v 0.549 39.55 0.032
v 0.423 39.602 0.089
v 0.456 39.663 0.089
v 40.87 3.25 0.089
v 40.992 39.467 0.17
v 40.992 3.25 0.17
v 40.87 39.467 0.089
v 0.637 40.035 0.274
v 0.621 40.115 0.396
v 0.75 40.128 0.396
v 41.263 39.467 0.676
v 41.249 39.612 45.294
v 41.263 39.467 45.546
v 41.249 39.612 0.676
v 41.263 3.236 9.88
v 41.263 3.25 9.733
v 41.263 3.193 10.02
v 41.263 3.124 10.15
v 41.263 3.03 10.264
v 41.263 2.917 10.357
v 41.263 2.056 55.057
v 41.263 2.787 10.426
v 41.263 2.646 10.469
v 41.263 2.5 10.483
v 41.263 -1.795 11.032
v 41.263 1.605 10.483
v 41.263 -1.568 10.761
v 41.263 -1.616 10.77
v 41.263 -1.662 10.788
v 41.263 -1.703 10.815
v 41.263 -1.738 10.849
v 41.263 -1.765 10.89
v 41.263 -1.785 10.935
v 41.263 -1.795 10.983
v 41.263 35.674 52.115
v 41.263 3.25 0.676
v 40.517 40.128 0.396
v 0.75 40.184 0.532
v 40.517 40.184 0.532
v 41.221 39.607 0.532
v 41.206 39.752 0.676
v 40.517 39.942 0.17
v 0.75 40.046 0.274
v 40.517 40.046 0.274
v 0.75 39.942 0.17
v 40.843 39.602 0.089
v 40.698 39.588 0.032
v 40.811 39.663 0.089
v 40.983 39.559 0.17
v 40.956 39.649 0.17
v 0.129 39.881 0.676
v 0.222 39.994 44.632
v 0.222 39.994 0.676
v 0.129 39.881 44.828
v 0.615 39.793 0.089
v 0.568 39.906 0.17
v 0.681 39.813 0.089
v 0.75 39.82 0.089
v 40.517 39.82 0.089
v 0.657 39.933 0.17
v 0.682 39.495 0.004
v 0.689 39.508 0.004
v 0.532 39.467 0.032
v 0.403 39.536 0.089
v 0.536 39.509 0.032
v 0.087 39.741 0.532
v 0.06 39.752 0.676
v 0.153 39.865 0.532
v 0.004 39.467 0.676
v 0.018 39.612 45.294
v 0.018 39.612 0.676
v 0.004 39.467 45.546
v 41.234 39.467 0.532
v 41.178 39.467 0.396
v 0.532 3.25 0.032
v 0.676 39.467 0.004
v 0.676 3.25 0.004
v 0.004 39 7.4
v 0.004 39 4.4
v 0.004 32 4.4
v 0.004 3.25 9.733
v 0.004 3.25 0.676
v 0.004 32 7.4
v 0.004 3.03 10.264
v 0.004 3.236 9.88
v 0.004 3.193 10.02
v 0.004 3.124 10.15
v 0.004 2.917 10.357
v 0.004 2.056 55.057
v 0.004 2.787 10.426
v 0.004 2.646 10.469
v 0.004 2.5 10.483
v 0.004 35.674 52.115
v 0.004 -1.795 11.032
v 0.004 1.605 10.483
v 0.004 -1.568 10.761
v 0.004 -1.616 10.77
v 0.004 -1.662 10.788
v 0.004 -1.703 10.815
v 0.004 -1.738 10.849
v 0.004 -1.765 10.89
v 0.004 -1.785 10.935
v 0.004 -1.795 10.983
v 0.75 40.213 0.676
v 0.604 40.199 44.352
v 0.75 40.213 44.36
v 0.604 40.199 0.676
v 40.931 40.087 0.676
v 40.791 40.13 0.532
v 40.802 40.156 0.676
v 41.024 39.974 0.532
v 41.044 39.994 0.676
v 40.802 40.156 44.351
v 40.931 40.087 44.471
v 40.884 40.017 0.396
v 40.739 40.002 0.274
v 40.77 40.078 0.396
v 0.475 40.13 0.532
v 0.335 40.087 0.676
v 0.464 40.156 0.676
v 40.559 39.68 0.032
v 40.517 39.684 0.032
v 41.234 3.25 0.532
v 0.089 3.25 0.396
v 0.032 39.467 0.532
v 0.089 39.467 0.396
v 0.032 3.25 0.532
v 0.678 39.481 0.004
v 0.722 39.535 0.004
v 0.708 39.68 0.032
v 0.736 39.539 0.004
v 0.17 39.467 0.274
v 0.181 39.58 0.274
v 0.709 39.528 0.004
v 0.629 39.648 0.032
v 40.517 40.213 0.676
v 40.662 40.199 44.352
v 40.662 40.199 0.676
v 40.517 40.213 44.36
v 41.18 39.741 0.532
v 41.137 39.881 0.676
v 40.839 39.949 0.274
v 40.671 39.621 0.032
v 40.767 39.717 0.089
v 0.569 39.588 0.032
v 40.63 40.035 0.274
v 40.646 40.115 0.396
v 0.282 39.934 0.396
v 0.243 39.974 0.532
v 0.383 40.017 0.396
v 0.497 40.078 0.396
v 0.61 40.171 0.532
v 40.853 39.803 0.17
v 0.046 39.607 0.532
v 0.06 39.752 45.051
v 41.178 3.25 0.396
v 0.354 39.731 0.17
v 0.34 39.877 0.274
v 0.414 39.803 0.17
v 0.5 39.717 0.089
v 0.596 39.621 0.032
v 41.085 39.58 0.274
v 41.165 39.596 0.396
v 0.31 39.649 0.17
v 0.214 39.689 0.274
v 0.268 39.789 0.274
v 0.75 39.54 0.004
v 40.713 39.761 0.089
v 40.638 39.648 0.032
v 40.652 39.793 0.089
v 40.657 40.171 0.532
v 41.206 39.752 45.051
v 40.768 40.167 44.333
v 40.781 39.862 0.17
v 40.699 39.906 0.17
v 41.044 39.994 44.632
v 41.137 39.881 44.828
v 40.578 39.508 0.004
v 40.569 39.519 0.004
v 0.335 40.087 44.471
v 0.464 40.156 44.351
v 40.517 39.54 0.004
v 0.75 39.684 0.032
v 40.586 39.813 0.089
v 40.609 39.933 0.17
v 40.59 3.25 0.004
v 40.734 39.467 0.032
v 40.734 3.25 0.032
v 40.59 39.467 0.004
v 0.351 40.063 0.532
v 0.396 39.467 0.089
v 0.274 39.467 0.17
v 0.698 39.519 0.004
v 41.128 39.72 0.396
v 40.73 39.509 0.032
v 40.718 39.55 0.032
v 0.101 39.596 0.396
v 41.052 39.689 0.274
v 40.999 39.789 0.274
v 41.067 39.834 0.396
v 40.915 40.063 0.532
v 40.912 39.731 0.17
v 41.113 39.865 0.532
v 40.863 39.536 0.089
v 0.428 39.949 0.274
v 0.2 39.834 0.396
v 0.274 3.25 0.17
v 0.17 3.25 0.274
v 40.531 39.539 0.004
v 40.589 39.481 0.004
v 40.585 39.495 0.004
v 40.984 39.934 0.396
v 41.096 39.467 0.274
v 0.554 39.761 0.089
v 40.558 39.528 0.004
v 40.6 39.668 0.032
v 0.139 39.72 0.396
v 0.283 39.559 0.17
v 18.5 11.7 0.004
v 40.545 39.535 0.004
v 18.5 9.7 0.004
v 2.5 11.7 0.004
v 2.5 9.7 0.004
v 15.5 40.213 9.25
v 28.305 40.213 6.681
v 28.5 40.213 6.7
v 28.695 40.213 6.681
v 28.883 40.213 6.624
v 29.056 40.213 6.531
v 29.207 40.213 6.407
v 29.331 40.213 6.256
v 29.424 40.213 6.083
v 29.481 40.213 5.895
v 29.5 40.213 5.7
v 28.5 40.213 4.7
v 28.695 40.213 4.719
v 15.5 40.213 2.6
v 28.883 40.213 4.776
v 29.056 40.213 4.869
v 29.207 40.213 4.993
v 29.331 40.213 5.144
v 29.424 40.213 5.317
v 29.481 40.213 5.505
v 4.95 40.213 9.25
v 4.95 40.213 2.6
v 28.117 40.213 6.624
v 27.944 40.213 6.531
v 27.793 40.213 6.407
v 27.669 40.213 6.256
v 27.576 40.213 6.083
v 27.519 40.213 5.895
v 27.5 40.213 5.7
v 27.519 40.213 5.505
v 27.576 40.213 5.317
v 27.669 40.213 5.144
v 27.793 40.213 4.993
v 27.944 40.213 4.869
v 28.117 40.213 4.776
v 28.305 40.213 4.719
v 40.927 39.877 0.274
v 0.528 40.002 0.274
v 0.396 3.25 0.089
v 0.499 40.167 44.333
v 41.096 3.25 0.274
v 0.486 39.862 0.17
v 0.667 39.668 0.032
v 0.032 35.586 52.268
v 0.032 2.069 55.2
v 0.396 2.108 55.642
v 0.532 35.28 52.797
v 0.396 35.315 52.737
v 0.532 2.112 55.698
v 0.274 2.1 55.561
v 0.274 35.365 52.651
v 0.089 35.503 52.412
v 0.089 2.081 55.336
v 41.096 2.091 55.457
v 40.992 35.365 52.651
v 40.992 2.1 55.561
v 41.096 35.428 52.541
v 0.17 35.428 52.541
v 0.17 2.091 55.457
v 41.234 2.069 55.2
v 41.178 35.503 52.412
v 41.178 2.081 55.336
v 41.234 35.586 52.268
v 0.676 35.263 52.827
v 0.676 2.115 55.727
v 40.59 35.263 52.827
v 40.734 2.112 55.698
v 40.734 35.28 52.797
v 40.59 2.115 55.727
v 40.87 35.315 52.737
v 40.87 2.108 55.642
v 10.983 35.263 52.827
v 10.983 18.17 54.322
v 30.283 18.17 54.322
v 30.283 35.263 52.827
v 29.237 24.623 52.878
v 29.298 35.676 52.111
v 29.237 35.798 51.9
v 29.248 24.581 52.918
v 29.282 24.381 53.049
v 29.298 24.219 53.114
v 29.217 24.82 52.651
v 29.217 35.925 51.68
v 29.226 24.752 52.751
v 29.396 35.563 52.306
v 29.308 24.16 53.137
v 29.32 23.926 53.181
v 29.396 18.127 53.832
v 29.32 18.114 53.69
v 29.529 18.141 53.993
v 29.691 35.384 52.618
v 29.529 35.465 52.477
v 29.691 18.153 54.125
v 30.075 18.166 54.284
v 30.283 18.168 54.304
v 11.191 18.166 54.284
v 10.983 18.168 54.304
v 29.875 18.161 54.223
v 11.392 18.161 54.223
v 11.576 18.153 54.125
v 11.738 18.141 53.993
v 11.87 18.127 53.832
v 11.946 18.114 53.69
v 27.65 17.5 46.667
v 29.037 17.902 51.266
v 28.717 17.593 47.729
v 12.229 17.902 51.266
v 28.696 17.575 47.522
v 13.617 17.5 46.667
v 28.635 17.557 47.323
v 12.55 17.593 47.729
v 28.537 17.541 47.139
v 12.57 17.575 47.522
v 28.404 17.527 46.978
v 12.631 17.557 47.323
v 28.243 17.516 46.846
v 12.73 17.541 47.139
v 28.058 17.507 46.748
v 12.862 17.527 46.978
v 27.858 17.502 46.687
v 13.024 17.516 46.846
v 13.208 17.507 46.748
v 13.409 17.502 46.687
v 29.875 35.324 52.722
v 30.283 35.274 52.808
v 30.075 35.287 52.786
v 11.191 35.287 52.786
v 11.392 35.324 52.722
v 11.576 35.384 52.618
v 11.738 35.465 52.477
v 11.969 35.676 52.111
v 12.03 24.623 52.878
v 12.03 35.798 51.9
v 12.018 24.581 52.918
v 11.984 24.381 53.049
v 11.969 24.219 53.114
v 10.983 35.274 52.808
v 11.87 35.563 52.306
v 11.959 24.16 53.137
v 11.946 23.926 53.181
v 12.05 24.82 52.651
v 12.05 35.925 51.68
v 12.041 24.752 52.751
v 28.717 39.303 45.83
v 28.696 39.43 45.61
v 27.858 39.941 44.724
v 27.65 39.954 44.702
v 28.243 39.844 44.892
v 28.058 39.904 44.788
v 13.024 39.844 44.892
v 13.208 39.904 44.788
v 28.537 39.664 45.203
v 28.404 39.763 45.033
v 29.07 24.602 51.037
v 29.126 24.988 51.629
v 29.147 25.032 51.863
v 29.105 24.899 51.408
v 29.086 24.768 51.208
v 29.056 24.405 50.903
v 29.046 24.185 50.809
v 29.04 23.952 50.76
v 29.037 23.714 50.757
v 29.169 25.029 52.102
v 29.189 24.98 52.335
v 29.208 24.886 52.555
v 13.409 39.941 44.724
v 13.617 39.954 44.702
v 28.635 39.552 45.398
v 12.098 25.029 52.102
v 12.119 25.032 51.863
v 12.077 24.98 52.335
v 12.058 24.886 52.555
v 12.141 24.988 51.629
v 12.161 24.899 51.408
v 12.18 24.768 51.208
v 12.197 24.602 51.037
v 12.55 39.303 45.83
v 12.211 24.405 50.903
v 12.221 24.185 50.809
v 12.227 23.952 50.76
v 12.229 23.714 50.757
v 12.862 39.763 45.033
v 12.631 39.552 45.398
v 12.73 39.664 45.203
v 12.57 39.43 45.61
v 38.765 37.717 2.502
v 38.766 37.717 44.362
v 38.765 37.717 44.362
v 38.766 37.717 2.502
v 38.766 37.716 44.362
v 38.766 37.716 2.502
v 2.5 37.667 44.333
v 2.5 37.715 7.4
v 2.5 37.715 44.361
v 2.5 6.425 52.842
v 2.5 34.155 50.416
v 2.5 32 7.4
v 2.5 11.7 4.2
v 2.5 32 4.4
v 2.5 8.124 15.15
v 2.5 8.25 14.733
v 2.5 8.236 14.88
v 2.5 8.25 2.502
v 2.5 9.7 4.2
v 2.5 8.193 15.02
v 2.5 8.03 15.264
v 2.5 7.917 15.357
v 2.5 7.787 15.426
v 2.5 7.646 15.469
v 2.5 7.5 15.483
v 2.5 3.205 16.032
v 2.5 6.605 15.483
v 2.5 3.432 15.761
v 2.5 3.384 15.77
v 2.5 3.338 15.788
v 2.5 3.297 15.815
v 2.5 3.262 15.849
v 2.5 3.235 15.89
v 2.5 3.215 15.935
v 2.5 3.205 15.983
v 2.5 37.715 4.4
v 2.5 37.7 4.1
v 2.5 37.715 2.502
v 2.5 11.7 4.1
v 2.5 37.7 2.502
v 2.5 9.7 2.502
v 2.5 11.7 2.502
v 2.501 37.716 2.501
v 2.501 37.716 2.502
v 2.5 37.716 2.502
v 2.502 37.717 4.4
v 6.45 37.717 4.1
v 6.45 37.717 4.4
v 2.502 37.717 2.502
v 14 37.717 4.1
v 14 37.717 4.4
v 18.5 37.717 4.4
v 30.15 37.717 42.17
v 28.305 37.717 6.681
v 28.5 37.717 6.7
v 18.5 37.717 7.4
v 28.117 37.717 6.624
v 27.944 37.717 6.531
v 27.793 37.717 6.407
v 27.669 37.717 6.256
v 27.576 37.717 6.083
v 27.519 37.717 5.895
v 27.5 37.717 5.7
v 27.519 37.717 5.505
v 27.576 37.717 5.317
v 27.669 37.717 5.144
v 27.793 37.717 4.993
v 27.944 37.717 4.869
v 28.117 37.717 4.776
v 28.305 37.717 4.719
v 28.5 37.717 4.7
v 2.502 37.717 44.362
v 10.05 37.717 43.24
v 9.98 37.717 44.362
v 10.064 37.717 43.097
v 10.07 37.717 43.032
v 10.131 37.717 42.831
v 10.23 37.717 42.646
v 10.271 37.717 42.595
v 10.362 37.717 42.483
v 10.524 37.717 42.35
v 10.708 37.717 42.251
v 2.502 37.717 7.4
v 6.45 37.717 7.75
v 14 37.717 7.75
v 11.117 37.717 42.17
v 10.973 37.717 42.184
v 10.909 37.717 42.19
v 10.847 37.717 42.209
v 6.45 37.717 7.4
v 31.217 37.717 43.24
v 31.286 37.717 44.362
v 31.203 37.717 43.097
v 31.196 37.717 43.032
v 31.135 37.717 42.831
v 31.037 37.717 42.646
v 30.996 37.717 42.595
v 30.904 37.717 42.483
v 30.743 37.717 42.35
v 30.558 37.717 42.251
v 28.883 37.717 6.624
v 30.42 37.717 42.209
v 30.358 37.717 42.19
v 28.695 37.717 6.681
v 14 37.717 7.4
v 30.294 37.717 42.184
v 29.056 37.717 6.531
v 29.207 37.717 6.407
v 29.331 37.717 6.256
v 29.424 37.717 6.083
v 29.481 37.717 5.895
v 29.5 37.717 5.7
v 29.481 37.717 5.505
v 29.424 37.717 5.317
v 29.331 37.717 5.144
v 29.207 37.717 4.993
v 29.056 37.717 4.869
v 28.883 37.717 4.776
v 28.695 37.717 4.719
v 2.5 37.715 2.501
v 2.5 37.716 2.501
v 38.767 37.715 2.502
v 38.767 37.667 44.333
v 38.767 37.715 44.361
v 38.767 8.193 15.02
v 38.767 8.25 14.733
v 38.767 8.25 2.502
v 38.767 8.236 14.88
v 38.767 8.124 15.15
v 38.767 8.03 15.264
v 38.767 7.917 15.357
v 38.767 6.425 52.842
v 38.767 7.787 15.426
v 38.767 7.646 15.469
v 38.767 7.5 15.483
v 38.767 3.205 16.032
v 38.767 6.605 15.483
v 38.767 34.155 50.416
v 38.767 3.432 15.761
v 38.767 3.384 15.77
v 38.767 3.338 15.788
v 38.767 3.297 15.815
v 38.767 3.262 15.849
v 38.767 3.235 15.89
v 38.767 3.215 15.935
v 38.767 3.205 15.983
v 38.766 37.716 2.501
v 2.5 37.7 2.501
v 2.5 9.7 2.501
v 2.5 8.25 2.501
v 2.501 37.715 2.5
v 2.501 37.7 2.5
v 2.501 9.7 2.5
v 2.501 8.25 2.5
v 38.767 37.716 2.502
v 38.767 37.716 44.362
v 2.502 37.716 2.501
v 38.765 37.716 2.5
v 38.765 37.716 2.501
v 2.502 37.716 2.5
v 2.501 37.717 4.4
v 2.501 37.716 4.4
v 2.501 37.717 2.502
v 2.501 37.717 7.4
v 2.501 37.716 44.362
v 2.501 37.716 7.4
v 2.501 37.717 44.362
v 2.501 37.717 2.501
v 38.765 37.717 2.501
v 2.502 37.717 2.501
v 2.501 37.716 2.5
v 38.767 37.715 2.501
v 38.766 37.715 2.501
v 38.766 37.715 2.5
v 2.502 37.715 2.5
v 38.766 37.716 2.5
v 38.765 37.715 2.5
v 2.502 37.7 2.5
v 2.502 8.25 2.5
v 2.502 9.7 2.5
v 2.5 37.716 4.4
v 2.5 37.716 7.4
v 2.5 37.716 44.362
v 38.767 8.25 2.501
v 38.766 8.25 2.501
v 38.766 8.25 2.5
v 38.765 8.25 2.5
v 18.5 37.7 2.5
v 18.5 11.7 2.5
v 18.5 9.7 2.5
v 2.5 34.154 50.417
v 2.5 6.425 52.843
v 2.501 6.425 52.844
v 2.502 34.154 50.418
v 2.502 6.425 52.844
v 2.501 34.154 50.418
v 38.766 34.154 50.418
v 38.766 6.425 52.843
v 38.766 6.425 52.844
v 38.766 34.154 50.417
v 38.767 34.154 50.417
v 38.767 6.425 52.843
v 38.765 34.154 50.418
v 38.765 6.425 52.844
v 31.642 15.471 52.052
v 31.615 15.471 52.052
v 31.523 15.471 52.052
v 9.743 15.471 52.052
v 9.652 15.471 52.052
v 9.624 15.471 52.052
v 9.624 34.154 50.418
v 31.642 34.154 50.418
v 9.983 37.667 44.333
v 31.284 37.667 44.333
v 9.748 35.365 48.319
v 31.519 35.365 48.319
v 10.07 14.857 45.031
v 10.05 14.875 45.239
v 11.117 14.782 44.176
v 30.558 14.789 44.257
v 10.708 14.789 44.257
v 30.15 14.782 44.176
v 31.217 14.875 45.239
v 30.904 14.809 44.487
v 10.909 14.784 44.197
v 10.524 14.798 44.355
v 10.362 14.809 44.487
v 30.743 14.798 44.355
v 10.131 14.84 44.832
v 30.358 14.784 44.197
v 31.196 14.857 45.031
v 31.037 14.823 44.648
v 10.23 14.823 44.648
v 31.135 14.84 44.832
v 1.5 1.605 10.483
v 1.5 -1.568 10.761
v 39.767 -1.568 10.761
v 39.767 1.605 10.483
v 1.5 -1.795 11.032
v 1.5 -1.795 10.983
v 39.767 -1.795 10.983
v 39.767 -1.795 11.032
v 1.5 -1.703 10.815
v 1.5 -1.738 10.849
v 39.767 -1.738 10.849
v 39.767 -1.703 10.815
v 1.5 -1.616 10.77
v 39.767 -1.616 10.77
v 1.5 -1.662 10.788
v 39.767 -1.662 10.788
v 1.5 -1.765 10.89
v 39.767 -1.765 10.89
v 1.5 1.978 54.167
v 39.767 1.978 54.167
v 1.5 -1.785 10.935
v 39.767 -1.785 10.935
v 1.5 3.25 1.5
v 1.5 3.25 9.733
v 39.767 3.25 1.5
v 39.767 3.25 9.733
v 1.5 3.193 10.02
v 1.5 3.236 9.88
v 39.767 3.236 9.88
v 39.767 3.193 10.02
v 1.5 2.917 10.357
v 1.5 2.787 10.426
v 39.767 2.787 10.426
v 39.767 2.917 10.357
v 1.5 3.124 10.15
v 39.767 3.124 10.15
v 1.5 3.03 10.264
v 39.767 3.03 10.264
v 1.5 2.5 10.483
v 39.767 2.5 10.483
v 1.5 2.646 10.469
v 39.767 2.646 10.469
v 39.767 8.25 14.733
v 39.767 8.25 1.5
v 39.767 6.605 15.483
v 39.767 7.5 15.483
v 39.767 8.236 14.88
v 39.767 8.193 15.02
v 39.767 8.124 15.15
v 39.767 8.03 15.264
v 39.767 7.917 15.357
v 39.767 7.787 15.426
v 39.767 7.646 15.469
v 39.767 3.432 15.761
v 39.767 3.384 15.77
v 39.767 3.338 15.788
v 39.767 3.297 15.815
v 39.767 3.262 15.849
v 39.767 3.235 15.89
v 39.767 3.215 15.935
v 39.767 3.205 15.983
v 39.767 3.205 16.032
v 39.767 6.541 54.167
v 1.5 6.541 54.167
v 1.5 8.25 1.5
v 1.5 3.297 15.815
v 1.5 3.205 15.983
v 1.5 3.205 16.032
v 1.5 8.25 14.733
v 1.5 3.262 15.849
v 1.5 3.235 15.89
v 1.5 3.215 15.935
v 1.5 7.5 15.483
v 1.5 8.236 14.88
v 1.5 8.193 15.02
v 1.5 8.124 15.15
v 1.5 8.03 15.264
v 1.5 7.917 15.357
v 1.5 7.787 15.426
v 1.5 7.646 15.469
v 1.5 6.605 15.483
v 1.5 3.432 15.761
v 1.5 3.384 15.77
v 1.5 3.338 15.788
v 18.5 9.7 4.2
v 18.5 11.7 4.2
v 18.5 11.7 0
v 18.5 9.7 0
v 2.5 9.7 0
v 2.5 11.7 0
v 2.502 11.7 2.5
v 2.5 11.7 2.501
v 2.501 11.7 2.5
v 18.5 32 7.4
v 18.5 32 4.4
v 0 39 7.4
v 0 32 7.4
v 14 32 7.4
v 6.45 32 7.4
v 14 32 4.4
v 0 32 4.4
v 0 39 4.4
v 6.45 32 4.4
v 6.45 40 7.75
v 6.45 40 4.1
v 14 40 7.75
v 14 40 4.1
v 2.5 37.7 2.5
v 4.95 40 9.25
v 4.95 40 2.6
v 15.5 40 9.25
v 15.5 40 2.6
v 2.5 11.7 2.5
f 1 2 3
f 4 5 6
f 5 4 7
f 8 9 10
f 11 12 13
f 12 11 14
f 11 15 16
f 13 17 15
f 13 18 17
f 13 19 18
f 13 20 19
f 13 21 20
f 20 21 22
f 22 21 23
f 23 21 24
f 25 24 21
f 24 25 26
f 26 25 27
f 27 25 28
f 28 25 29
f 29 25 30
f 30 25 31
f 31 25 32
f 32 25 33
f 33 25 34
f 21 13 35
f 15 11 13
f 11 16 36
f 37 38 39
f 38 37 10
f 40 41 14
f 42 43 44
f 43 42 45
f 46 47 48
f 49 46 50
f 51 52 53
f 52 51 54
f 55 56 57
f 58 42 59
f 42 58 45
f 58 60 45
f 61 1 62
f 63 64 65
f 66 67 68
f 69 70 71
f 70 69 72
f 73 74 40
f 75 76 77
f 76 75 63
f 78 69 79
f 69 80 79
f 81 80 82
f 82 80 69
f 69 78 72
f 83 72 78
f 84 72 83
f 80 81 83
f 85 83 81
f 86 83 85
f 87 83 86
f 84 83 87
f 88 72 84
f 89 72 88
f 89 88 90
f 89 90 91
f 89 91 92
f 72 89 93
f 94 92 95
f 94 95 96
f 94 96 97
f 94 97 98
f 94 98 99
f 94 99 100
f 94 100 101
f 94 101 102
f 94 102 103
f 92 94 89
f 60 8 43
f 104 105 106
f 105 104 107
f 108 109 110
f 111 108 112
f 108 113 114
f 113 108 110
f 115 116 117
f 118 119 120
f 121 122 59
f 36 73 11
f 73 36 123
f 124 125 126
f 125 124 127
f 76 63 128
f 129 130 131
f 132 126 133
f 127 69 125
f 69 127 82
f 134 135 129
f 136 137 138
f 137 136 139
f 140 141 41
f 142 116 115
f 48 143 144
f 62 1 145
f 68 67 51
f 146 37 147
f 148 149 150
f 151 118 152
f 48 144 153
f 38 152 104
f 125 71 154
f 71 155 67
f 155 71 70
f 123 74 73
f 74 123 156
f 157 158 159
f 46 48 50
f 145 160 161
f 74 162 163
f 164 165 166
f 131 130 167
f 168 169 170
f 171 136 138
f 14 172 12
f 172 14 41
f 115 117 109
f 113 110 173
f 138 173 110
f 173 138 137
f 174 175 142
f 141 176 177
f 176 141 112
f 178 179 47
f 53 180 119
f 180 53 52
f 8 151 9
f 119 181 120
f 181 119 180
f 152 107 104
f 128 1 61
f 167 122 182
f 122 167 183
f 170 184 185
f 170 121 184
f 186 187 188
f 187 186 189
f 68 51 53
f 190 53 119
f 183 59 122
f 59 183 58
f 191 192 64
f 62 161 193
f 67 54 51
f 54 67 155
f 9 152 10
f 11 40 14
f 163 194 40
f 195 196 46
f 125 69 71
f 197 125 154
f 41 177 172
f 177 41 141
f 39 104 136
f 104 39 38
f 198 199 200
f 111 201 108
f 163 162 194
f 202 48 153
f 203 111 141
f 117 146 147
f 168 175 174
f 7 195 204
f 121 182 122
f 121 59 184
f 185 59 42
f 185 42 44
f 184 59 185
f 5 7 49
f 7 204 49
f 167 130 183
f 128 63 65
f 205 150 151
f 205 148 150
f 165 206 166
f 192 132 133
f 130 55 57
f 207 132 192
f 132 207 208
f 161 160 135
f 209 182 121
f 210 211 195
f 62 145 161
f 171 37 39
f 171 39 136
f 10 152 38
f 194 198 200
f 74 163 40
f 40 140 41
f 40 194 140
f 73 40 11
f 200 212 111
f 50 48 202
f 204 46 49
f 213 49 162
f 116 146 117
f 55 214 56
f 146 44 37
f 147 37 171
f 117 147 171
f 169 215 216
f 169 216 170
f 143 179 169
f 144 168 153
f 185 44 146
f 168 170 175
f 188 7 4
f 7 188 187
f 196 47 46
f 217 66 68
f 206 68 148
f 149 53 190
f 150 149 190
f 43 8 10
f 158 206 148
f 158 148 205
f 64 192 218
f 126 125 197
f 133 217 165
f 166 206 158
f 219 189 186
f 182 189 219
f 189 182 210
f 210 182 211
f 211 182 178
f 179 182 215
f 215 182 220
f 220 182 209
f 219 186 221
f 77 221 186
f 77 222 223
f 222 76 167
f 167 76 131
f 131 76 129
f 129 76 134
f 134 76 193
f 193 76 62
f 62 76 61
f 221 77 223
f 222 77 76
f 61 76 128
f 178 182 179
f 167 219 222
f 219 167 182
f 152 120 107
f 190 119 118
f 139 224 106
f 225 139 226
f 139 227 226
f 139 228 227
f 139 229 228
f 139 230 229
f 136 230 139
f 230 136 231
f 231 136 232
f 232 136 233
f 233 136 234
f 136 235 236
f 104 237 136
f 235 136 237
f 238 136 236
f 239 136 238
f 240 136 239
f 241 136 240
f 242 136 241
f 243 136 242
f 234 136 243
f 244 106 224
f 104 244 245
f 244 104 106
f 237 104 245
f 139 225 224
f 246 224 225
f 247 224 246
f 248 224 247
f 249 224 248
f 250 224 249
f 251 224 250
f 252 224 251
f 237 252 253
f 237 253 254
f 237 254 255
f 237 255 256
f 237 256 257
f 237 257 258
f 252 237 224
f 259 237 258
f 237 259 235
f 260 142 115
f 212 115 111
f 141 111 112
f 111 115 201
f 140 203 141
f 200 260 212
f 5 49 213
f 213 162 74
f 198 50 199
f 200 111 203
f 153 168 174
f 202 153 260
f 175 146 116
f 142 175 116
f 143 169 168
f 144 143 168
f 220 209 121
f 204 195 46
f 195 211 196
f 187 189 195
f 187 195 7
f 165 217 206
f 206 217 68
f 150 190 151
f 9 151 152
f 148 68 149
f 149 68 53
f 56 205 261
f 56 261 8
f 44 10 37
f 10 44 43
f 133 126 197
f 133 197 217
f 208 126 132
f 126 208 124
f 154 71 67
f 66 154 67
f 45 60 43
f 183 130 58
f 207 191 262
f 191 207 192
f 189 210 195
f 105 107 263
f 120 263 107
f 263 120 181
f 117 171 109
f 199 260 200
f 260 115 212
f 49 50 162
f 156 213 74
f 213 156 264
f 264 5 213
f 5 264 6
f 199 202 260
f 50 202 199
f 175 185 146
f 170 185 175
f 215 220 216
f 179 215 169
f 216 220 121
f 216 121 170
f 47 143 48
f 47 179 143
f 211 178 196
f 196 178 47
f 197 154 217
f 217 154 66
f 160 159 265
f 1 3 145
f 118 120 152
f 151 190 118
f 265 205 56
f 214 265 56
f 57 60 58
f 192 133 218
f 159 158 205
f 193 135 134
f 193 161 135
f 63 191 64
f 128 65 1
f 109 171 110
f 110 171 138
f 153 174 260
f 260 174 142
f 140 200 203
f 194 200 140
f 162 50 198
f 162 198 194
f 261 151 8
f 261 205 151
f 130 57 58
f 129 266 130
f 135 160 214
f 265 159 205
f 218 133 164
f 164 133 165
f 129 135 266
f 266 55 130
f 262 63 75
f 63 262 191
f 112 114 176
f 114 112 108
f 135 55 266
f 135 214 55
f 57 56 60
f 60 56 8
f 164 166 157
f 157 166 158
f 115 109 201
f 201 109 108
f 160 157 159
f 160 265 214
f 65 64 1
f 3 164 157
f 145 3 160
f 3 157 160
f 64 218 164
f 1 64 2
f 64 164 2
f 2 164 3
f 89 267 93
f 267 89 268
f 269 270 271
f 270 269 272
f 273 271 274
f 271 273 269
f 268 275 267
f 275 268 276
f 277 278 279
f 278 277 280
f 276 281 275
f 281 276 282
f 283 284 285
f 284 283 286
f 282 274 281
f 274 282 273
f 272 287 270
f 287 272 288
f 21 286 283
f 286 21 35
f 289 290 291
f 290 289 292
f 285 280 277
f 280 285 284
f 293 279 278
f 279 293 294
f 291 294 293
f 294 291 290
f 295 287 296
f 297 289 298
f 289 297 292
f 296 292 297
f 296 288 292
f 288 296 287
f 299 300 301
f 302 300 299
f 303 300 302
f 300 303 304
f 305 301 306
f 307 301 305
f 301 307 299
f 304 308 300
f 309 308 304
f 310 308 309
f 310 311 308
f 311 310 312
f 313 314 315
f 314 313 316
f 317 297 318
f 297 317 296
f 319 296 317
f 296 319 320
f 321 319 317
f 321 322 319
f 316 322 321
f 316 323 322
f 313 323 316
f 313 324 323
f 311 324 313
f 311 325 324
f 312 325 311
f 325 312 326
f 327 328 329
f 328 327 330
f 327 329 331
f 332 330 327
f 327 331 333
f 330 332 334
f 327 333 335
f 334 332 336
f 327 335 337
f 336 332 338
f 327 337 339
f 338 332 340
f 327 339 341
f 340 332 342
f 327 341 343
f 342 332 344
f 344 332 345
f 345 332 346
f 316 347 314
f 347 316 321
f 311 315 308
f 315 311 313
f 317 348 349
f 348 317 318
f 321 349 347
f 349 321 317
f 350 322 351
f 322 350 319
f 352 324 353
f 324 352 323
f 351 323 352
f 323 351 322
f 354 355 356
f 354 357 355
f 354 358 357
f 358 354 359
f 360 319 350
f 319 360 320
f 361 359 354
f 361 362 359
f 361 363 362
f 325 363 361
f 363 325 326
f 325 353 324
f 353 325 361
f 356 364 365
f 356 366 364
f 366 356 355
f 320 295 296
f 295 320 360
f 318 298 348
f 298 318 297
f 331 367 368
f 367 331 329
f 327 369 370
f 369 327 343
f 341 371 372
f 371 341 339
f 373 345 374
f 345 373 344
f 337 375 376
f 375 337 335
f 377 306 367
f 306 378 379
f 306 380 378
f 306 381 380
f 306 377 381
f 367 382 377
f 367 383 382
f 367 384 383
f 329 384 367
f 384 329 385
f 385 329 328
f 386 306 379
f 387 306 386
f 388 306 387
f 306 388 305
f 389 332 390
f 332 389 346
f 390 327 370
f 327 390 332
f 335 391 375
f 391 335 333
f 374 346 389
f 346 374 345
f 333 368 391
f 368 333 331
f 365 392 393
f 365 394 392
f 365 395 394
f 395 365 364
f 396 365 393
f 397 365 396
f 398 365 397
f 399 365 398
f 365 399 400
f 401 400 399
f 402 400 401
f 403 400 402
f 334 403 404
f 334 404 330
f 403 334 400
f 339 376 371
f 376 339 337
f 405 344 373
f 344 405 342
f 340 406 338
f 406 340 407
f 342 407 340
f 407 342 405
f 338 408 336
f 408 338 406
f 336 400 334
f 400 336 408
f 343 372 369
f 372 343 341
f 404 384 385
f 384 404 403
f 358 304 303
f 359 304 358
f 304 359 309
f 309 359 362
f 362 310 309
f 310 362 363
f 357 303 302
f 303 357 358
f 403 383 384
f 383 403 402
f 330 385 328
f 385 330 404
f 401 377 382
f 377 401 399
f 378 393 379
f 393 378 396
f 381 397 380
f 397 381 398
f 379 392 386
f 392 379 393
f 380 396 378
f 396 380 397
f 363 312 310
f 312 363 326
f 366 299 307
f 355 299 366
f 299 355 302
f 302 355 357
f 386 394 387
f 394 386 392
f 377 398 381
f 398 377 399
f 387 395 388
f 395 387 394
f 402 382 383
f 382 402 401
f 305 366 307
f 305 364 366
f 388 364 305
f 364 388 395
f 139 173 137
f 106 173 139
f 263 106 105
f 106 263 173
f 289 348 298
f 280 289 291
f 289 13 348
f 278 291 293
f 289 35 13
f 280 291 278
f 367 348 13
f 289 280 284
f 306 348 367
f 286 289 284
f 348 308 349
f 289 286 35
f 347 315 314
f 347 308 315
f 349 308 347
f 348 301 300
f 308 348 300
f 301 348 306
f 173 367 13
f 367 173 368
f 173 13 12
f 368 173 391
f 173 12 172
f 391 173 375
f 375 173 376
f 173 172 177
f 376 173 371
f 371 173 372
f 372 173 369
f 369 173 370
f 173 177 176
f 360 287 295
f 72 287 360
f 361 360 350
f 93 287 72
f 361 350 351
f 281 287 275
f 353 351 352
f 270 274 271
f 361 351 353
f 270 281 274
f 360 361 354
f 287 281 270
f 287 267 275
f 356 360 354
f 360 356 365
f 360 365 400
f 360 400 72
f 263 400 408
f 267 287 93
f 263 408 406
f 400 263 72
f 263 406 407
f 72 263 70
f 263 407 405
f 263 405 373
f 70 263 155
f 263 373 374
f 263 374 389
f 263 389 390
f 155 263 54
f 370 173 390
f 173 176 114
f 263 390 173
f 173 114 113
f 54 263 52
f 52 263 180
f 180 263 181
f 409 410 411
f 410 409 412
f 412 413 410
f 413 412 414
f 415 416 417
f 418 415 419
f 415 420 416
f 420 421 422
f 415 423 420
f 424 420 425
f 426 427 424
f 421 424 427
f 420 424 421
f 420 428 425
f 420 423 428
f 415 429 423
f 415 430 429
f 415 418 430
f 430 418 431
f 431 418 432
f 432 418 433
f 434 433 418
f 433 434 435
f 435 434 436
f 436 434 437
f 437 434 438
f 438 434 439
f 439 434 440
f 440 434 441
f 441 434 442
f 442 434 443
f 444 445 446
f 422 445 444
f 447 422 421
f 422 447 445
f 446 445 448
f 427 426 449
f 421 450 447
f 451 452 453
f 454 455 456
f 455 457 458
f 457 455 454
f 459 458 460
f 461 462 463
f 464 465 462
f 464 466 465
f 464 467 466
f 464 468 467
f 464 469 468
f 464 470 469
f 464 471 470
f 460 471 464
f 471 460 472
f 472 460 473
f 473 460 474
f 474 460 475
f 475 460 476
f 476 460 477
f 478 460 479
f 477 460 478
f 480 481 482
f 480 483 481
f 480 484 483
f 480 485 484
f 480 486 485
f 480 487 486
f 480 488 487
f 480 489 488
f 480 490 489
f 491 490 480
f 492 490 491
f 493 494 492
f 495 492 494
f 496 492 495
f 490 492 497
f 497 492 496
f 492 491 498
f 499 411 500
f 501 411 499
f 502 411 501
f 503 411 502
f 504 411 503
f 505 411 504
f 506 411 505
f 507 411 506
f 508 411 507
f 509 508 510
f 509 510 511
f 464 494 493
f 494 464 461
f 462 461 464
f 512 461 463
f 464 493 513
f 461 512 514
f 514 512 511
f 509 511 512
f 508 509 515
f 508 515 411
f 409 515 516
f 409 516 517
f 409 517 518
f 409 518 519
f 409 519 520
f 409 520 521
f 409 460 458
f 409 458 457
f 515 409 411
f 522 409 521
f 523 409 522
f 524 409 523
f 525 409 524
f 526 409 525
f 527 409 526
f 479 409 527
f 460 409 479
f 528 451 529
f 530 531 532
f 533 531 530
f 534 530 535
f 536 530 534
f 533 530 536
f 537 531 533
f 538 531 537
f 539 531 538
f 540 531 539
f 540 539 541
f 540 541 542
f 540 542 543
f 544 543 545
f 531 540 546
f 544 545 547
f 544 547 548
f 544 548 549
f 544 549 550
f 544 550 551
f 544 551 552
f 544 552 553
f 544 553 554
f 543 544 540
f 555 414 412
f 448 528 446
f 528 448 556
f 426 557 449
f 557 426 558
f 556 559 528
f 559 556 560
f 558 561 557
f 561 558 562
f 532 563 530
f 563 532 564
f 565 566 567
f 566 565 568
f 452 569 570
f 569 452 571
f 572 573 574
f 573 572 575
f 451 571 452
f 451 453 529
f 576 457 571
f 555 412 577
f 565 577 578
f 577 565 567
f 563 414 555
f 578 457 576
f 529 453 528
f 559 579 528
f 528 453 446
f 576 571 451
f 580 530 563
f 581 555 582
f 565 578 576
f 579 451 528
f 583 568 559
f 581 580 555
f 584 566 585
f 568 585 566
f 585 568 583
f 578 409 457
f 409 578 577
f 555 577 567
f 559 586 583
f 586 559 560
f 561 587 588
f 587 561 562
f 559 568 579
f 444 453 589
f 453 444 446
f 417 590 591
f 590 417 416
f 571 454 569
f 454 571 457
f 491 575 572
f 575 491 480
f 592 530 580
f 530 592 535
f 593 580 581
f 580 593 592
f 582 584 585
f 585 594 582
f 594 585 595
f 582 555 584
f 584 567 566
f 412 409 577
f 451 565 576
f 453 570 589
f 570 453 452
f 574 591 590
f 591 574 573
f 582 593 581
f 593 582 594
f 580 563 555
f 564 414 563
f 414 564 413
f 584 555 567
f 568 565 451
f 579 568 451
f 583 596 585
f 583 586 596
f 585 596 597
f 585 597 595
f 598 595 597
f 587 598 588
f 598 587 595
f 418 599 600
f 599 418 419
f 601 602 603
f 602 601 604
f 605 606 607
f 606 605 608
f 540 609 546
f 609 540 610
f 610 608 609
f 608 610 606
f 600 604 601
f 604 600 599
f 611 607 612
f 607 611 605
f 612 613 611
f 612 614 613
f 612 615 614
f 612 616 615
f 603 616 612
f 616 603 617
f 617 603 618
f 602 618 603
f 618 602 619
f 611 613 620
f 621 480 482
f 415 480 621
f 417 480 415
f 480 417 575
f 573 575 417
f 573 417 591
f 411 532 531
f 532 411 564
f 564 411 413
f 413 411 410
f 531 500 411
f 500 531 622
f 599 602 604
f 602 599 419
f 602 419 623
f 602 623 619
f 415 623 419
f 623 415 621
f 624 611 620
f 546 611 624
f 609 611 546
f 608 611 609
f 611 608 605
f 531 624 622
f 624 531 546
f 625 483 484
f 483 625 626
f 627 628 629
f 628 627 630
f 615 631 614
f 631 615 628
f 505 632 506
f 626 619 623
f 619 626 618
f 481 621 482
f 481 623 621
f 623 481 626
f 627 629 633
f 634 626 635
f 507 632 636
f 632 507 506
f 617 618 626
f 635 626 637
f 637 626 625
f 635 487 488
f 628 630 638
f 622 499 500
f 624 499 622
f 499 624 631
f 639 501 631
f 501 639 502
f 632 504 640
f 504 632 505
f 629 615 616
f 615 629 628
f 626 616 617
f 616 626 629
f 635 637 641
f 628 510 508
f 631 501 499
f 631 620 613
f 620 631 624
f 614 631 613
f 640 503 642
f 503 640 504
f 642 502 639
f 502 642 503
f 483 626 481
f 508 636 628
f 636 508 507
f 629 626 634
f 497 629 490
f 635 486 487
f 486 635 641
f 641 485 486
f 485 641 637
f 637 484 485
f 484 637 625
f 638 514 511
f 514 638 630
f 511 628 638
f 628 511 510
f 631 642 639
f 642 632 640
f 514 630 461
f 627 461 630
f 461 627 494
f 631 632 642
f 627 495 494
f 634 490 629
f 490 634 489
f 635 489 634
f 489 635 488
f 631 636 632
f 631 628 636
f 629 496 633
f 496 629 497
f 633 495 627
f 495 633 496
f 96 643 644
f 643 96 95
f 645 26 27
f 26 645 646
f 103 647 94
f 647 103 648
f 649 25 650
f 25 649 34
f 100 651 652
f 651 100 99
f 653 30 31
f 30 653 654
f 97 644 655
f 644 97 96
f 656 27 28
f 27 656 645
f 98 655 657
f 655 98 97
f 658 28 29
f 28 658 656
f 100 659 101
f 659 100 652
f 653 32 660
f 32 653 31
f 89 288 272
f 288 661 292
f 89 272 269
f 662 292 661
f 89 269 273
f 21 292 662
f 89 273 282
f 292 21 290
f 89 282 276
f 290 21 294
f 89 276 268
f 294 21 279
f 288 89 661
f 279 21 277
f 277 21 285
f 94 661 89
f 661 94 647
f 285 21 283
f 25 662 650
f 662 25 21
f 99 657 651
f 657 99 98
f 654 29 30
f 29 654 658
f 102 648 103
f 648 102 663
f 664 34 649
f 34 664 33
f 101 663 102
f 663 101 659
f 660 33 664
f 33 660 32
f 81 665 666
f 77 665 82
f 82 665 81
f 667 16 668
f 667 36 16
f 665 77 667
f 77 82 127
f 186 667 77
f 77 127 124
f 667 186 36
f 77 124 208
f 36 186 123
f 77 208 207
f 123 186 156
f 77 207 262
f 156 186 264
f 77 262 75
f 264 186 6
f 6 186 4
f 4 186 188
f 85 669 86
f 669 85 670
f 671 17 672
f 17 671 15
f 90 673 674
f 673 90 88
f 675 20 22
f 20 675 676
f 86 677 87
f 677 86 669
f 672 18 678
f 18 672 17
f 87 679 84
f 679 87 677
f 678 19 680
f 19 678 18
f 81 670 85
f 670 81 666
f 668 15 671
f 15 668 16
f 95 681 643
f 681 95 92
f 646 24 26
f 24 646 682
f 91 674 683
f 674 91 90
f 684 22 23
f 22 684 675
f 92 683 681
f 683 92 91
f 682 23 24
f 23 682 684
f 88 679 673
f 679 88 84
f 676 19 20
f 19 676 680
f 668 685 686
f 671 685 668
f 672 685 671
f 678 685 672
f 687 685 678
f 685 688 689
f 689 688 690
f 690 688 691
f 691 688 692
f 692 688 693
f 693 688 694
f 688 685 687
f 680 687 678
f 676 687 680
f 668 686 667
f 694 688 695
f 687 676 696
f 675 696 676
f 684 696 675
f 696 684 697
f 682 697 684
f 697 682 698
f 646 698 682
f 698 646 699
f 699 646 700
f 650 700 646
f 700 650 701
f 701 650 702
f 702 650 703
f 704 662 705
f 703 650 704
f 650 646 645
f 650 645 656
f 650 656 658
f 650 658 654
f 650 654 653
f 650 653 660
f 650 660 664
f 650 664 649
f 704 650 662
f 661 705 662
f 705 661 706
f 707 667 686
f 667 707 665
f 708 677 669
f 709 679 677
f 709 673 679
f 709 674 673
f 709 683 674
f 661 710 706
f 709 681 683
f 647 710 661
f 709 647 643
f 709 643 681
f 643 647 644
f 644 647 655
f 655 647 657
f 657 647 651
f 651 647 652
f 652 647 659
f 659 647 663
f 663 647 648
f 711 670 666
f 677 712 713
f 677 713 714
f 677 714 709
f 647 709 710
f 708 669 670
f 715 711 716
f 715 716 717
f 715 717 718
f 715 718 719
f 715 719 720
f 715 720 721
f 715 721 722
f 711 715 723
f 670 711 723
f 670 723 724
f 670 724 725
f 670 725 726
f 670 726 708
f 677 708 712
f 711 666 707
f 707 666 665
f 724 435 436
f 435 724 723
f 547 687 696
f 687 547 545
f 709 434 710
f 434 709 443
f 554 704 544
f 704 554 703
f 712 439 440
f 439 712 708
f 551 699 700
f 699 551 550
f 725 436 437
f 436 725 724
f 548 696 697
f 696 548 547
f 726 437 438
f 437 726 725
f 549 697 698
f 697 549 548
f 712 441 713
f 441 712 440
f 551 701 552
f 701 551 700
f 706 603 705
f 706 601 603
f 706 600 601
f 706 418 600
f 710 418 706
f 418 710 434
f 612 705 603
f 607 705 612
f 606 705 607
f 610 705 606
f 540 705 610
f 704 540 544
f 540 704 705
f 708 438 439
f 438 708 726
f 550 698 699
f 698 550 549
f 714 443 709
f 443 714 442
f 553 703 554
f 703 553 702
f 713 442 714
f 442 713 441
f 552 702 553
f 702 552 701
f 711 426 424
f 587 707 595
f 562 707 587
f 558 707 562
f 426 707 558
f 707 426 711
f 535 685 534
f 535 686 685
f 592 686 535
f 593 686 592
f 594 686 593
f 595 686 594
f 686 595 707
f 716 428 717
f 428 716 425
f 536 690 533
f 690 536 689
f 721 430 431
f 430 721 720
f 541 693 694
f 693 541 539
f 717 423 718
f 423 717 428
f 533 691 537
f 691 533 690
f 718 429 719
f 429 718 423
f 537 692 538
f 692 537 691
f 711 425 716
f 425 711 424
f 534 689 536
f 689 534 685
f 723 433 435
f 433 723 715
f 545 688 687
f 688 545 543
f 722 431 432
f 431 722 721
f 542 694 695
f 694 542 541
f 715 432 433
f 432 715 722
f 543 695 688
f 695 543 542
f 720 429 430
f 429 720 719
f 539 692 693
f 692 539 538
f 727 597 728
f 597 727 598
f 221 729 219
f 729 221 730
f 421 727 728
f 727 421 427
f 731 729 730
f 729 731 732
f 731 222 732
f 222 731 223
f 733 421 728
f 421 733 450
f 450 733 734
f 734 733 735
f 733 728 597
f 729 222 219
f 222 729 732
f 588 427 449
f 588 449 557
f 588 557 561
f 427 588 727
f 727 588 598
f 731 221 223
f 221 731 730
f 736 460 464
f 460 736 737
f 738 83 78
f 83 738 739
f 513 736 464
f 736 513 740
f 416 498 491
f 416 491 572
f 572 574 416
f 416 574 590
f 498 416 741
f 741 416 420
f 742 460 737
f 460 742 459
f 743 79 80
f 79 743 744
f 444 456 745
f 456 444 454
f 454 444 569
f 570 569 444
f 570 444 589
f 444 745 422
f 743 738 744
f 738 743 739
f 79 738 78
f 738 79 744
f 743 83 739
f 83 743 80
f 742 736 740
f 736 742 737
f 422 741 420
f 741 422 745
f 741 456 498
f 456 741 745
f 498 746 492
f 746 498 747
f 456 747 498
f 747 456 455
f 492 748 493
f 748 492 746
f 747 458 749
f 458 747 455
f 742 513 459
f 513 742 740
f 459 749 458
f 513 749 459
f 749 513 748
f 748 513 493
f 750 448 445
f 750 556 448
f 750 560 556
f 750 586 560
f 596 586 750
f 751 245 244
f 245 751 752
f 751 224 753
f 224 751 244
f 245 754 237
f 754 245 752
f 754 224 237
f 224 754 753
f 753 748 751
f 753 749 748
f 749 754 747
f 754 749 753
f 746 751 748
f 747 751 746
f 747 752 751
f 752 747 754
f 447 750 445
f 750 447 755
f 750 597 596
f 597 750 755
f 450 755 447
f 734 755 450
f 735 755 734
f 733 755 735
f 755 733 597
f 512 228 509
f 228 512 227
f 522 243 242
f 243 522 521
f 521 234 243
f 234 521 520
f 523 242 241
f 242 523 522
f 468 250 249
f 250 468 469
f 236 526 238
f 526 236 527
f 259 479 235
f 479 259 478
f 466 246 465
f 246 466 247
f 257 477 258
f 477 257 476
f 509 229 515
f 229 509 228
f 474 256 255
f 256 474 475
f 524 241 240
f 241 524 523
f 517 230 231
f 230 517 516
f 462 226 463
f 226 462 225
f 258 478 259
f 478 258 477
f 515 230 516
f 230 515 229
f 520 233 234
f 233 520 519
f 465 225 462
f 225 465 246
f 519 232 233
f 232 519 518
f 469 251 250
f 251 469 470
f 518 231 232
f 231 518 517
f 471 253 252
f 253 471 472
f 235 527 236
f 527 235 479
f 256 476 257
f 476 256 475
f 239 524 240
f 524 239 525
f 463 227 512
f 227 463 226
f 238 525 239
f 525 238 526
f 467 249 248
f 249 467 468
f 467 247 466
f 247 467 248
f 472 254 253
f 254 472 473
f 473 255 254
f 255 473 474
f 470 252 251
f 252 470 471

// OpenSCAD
//All measurements in mm

$fa=8; //segments/360 degrees
$fs=0.1; //min size of fragment
$fn=32; //override amount of facets


scale=50/300; //1-to-6

wall=2.5; //real mms

overlap=5; //real mms; overlap between halves 
overlapth=1.5; //real mms: thickness of material in overlap

//1 - cutout
//2 - full render
//3 - intersection case - pcb
//4 - front half / back half
//5 - front half / back half side-by-side
//6 - back
//7 - front
type=6;


if (type==1) {
    difference() {
        union() {
            mac_half_front(wall, scale, overlap, overlapth);
            translate([0,1,0]) mac_half_back(wall, scale, overlap, overlapth);
        }
        translate([125*scale, -500, -500]) cube([1000, 1000, 1000], false);
    }
    displaypcb(wall, scale);
    translate([0,1,0]) usbserpcb_mounted(wall);
} else if (type==2) {
    union() {
        mac_half_front(wall, scale, overlap, overlapth);
        mac_half_back(wall, scale, overlap, overlapth);
    }
    displaypcb(wall, scale);
    usbserpcb_mounted(wall);
} else if (type==3) {
    intersection() {
        union() {
            mac_half_front(wall, scale, overlap, overlapth);
            mac_half_back(wall, scale, overlap, overlapth);
        }
        displaypcb(wall, scale);
    }
} else if (type==4 || type==5) {
    translate([0, 10, 0]) union() {
        mac_half_back(wall, scale, overlap, overlapth);
        usbserpcb_mounted(wall);
    }
    rotate([0,0,type==5?180:0]) union () {
        mac_half_front(wall, scale, overlap, overlapth);
        *color("red") displaypcb(wall, scale);
    }
} else if (type==6) {
    mac_half_back(wall, scale, overlap, overlapth);
} else if (type==7) {
    mac_half_front(wall, scale, overlap, overlapth);
}


module mac_half_front(wall, scale, overlap, overlapth) {
    union() {
        scale(scale) union() {
            difference() {
                mac_hull(wall/scale);
                mac_crack_divider();
            }
            intersection() {
                mac_overlap_inner_edge(overlapth/scale);
                difference() {
                    mac_crack_divider_expanded(-0.8/scale);
                    mac_crack_divider_expanded(overlap/scale);
                }
            }
        }
        difference() {
            union() {
                //bottom screen tab
                translate([17+wall, -1, 8]) rotate([-20, 0, 0]) cube([10, 2, 3]);
                //top tab
                translate([14.5+wall, 1, 50]) cube([4, 5, 3]);
            }
            displaypcb(wall, scale);
        }
    }
}


module mac_half_back(wall, scale, overlap, overlapth) {
    union() {
    difference() {
        union() {
            scale(scale) difference() {
                intersection() {
                    mac_hull(wall/scale);
                    mac_crack_divider();
                }
                intersection() {
                    mac_overlap_inner_edge(overlapth/scale);
                    difference() {
                        mac_crack_divider();
                        mac_crack_divider_expanded(overlap/scale);
                    }
                }
            }
            //front tab for usb-ser conv
            translate([wall, 37.7-26-2, 0]) cube([16, 2, wall+1.7]);
            //back tabs for usb-ser conv
            translate([0, 37-5, wall+1.9]) cube([16+wall, 7, 3]); 
        }
        usb_hole(wall);
        mouse_hole(wall);
        usbserpcb_mounted(wall);        
    }
    //Enable for signatures in backplate
    //Disabled because 3d-printer doesn't really show these...
    //translate([wall, 38.2, 8+wall]) rotate([90, 0, 0]) scale(.2) linear_extrude(height = 3.3) import(file = "signatures.dxf");

    }
}

module usb_hole(wall) {
    w=3; //extra width for bevel
    i=0.2; //inset of bevel
    translate([16+wall,37.7,wall])  rotate([0,0,180]) union() {
        translate([4.5, -100, 1.6]) cube([7.55, 100 , 3.65]);
        translate([4.5-w/2, -wall+i-10, 1.6-w/2]) cube([7.55+w, 10 , 3.65+w]);
    }
}

module mouse_hole(wall) {
    translate([26+wall, 37.7, wall+3.2]) rotate([-90, 0, 0]) cylinder(d=2, 50);
}

module usbserpcb_mounted(wall) {
    translate([16+wall,37.7,wall]) rotate([0,0,180]) usbserpcb();
}

module usbserpcb() {
    cube([16, 26, 1.6]);
    translate([4.5, 0, 1.6]) cube([7.55, 9 , 3.65]);
}



//generates square hull you can cut the inner overlap out of
module mac_overlap_inner_edge(overlapth, isInner) {
    difference() {
        translate([overlapth, -200, overlapth]) cube([247.6-overlapth*2,500,334-overlapth*2]);
        translate([overlapth*2, -200, overlapth*2]) cube([247.6-overlapth*4,500,334-overlapth*4]);
    }
    
}


module mac_hull(wall) {
    difference() {
        mac_hull_solid(0);
        union() {
            mac_hull_solid(wall);
             translate([0, -25.4, 44.5]) rotate([-5,0, 0]) union() {            //Cutout the screen in the back of the frontplate as well
                translate([247.6/2, 0, 185]) rotate([90, 0, 0]) scale(1.69) mac_screen_cutout(wall/1.69);
                //Cutout fdd slot
                translate([129, -5.2, 62.8]) rotate([90,0,0]) fdd_cutout();
             }
        }
    }
}




module displaypcb(wall, scale) {
    translate([wall+.6,-1.6,60*scale]) rotate([90-5,180,180]) translate([0, -42, wall-2.05]) union() {
        cube([35,42, 0.8]); //main pcb
        translate([1, 6.8, 0]) cube([16, 24, 3.6+0.8]); //wroom block
        translate([1.6, 0.4, -1.2]) difference() { //screen
            cube([32.2, 36.75, 1.2]);
            translate([1.5, 2.73, -10+0.7]) cube([28.9, 19.5, 10]);
        }
    }
}



module mac_hull_solid(shrink) {
    rnd=4.5; //rounding of outer case
    //ir=0.8; //rounding of outmost screen bezel
    //a=-6.18; //angle of front
    r=(rnd<shrink)?0.01:rnd-shrink;
    difference() {
        union() {
            difference() {
                //Cube that makes up bottom and back of mac
                translate([shrink, shrink, shrink]) roundedcube(247.6-shrink*2, 241.3-shrink*2, 310-shrink*2, r);
                //cut off bit that sticks through front panel           
                translate([-500, -1000+150, 150]) cube([1000, 1000, 1000]);
            }
            //add in rotated front bulk
            translate([0, -25.4, 44.5]) rotate([-5,0, 0]) mac_front_bulk(4.5, 2, shrink);
        }
        union() {
            //Cut off diagonal bit in top-back of case
            translate([-1, 241-shrink, 266]) rotate([30, 0, 0]) cube([300, 300, 300], false);
            //Handle handle
            translate([247.6/2,105-shrink,280]) rotate([90+5,0,180]) mac_handle_hole(shrink);
        }
    }
}

module mac_front_bulk(or, ir, shrink) {
    fp_th=5.2; //thickness of front plate)
    fp_extra=(shrink<fp_th)?0:shrink-fp_th;
    or=(or<shrink)?0.01:or-shrink;
    ir=(ir<shrink)?0.01:ir-shrink;
    difference() {
        union() {
            difference() {
                translate([0+shrink, -20+shrink, 0+shrink]) roundedcube(247.6-shrink*2, 233.9+20-shrink*2, 292.1-shrink*2, or);
                union() {
                    //Cut off front where faceplate goes
                    translate([-500, -1000+fp_extra, -500]) cube([1000, 1000, 1000]);
                }
            }
            if (shrink==0) {
                mac_front_faceplate(or, ir);
            } else {
                translate([247.6/2, 50, 185])  rotate([90,0,0])scale([1.69, 1.69, 100]) mac_screen_cutout_back();
                
            }
        }
    }
}



//negative: handle hole (as in: hole for the handle to carry the mac)
//needs to be bigger when shrink increases
module mac_handle_hole(shrink) {
    r=6.4;
    difference() {
        union() {
            hull() {
                translate([-97/2+r-shrink, r-shrink ,0]) cylinder(r=r, 200);
                translate([97/2-r+shrink, r-shrink ,0]) cylinder(r=r, 200);
                translate([-103/2+r-shrink, 46-r ,0]) cylinder(r=r, 200);
                translate([103/2-r+shrink, 46-r ,0]) cylinder(r=r, 200);
            }
            if (shrink==0) {
                difference() {
                    translate([-103/2-r, 46-r, 0]) cube([103+2*r, 200, 200]);
                    union() {
                        translate([-103/2-r, 46-r ,0]) cylinder(r=r, 200);
                        translate([103/2+r, 46-r ,0]) cylinder(r=r, 2200);                
                    }
                }
            }
        }
        if (shrink==0) {
            //thing where you hold the mac
            translate([-100, 35, 0]) rotate([90,0,90]) hull() {
                cylinder(d=14.6, 200);
                translate([0, 35, 0]) cylinder(d=14.6, 200);            
            }
        }
    }
}

//crack divider, but moved up/right to get the overlap edge
module mac_crack_divider_expanded(ex) {
    translate([0,ex,ex]) mac_crack_divider();
}

module mac_crack_divider() {
    difference() {
        rotate([-5, 0, 0]) translate([0, -15, 65]) union() {
            hull () {
                translate([0,0,0]) rotate([0,90,0]) cylinder(r=1.5, 1000);
                translate([0,0,1000]) rotate([0,90,0]) cylinder(r=1.5, 1000);
                translate([0,1000,0]) rotate([0,90,0]) cylinder(r=1.5, 1000);
            }
            translate([-500,20,-500]) cube([1000,1000,1000]);            
        }
        translate([0, 15, 0]) hull() {
            translate([-500, 0, -200]) rotate([0,90,0]) cylinder(r=4.5, 1000);
            translate([-500, 0, 58.4]) rotate([0,90,0]) cylinder(r=4.5, 1000);            
            translate([-500, -200, 58.4]) rotate([0,90,0]) cylinder(r=4.5, 1000);            
        }
    }
}


module mac_front_faceplate() {
    mac_front_faceplate_outer(4.5, 2);
}

module mac_front_faceplate_outer(or, ir) {
    hull() {
        //connection to bulk of case
        translate([0+or, 0, 0+or]) rotate([90,0,0]) cylinder(1, or);
        translate([0+or, 0, 292.1-or]) rotate([90,0,0]) cylinder(1, or);
        translate([247.6-or, 0, 0+or]) rotate([90,0,0]) cylinder(1, or);
        translate([247.6-or, 0, 292.1-or]) rotate([90,0,0]) cylinder(1, or);
        //face of mac
        translate([0+3.4+ir, 1-5.2, 0+8+ir]) rotate([90,0,0]) cylinder(1, ir);
        translate([0+3.4+ir, 1-5.2, 292.1-10-ir]) rotate([90,0,0]) cylinder(1, ir);
        translate([247.6-3.4-ir, 1-5.2, 0+8+ir]) rotate([90,0,0]) cylinder(1, ir);
        translate([247.6-3.4-ir, 1-5.2, 292.1-10-ir]) rotate([90,0,0]) cylinder(1, ir);
    }
}


//WARNING: Everything inhere is adjusted using the wrong scale because I didn't pay attention. I'm too lazy to fix it all up, so if you use it scale(1.69) it first.
module mac_screen_cutout(depth) {
    or=2.5;
    ow=123-or*2;
    oh=94-or*2;
    hull() {
        //back cutout; fakes CRT curves
        translate([0,0,2.5-depth]) mac_screen_cutout_back();
        //very front of bezel
        translate([ow/2, oh/2, 5.2-1]) cylinder(1, r=or);
        translate([ow/2, -oh/2, 5.2-1]) cylinder(1, r=or);
        translate([-ow/2, oh/2, 5.2-1]) cylinder(1, r=or);
        translate([-ow/2, -oh/2, 5.2-1]) cylinder(1, r=or);
    }
}

//Same scale(1.69) is required here.
module mac_screen_cutout_back() {
    intersection() {
        intersection() {
            union() {
                translate([0, 23-(46-42), 0]) scale([246, 46, 1]) cylinder(10, d=1);
                translate([0, -23+(46-42), 0]) scale([246, 46, 1]) cylinder(10, d=1);
            }
            union() {
                translate([-56/2, 0, 0]) scale([56, 300, 1]) cylinder(1, d=1);
                translate([0, 0, 0]) scale([56, 300, 1]) cylinder(1, d=1);
                translate([56/2, 0, 0]) scale([56, 300, 1]) cylinder(1, d=1);
                
            }
        }
        
        union() {
            dr=6.2;
            w=111-dr*2;
            h=82-dr*2;
            translate([w/2, h/2, 0]) cylinder(10, r=6.2);
            translate([w/2, -h/2, 0]) cylinder(10, r=6.2);
            translate([-w/2, h/2, 0]) cylinder(10, r=6.2);
            translate([-w/2, -h/2, 0]) cylinder(10, r=6.2);
            translate([-w/2, -500, 0]) cube([w, 1000, 10]);
            translate([-500, -h/2, 0]) cube([1000, h, 10]);
        }
    }
}


//Negative space of FDD.
module fdd_cutout() {
        union() {
            fdd_cutout_inner_slot();
            fdd_cutout_inner_right();
            translate([0,0,0]) fdd_cutout_bezel();
            //fdd force eject button
            translate([98, -5,-50]) cylinder(100, r=1);
        }
}


module fdd_cutout_bezel() {
    thickness=1;
    union() {
        hull() {
            translate([0,0,5-thickness]) fdd_cutout_inner_slot();
            translate([-10.4, -11.5/2, 0]) flatroundedcube(112.3, 11.5, 10, 1);
        }
        hull() {
            translate([0,0,5-thickness]) fdd_cutout_inner_right();
            translate([57.7,-24/2 , 0]) flatroundedcube(44.5, 24, 10, 1);
        }
    }
}


module fdd_cutout_inner_slot() {
    translate([0, -2.6, -5]) cube([93.4, 5.2, 10]);
}

module fdd_cutout_inner_right() {
    translate([65.7, -8.9, -5]) flatroundedcube(27.7, 17.8, 10, 2.1); 
}

//Cube with 4 edges rounded; front/back are flat
module flatroundedcube(x,y,z,r) {
    hull(){
        translate([0+r, 0+r, 0]) cylinder(z, r=r);
        translate([0+r, y-r, 0]) cylinder(z, r=r);
        translate([x-r, 0+r, 0]) cylinder(z, r=r);
        translate([x-r, y-r, 0]) cylinder(z, r=r);
    }
}


//Cube with all edges rounded
module roundedcube(x, y, z, r) {
    if(0) {
        cube([x,y,z], false);
    } else {
        hull() {
            translate([0+r,0+r,0+r]) sphere(r);
            translate([x-r,0+r,0+r]) sphere(r);
            translate([0+r,y-r,0+r]) sphere(r);
            translate([x-r,y-r,0+r]) sphere(r);
            translate([0+r,0+r,z-r]) sphere(r);
            translate([x-r,0+r,z-r]) sphere(r);
            translate([0+r,y-r,z-r]) sphere(r);
            translate([x-r,y-r,z-r]) sphere(r);
        }
    }
}
